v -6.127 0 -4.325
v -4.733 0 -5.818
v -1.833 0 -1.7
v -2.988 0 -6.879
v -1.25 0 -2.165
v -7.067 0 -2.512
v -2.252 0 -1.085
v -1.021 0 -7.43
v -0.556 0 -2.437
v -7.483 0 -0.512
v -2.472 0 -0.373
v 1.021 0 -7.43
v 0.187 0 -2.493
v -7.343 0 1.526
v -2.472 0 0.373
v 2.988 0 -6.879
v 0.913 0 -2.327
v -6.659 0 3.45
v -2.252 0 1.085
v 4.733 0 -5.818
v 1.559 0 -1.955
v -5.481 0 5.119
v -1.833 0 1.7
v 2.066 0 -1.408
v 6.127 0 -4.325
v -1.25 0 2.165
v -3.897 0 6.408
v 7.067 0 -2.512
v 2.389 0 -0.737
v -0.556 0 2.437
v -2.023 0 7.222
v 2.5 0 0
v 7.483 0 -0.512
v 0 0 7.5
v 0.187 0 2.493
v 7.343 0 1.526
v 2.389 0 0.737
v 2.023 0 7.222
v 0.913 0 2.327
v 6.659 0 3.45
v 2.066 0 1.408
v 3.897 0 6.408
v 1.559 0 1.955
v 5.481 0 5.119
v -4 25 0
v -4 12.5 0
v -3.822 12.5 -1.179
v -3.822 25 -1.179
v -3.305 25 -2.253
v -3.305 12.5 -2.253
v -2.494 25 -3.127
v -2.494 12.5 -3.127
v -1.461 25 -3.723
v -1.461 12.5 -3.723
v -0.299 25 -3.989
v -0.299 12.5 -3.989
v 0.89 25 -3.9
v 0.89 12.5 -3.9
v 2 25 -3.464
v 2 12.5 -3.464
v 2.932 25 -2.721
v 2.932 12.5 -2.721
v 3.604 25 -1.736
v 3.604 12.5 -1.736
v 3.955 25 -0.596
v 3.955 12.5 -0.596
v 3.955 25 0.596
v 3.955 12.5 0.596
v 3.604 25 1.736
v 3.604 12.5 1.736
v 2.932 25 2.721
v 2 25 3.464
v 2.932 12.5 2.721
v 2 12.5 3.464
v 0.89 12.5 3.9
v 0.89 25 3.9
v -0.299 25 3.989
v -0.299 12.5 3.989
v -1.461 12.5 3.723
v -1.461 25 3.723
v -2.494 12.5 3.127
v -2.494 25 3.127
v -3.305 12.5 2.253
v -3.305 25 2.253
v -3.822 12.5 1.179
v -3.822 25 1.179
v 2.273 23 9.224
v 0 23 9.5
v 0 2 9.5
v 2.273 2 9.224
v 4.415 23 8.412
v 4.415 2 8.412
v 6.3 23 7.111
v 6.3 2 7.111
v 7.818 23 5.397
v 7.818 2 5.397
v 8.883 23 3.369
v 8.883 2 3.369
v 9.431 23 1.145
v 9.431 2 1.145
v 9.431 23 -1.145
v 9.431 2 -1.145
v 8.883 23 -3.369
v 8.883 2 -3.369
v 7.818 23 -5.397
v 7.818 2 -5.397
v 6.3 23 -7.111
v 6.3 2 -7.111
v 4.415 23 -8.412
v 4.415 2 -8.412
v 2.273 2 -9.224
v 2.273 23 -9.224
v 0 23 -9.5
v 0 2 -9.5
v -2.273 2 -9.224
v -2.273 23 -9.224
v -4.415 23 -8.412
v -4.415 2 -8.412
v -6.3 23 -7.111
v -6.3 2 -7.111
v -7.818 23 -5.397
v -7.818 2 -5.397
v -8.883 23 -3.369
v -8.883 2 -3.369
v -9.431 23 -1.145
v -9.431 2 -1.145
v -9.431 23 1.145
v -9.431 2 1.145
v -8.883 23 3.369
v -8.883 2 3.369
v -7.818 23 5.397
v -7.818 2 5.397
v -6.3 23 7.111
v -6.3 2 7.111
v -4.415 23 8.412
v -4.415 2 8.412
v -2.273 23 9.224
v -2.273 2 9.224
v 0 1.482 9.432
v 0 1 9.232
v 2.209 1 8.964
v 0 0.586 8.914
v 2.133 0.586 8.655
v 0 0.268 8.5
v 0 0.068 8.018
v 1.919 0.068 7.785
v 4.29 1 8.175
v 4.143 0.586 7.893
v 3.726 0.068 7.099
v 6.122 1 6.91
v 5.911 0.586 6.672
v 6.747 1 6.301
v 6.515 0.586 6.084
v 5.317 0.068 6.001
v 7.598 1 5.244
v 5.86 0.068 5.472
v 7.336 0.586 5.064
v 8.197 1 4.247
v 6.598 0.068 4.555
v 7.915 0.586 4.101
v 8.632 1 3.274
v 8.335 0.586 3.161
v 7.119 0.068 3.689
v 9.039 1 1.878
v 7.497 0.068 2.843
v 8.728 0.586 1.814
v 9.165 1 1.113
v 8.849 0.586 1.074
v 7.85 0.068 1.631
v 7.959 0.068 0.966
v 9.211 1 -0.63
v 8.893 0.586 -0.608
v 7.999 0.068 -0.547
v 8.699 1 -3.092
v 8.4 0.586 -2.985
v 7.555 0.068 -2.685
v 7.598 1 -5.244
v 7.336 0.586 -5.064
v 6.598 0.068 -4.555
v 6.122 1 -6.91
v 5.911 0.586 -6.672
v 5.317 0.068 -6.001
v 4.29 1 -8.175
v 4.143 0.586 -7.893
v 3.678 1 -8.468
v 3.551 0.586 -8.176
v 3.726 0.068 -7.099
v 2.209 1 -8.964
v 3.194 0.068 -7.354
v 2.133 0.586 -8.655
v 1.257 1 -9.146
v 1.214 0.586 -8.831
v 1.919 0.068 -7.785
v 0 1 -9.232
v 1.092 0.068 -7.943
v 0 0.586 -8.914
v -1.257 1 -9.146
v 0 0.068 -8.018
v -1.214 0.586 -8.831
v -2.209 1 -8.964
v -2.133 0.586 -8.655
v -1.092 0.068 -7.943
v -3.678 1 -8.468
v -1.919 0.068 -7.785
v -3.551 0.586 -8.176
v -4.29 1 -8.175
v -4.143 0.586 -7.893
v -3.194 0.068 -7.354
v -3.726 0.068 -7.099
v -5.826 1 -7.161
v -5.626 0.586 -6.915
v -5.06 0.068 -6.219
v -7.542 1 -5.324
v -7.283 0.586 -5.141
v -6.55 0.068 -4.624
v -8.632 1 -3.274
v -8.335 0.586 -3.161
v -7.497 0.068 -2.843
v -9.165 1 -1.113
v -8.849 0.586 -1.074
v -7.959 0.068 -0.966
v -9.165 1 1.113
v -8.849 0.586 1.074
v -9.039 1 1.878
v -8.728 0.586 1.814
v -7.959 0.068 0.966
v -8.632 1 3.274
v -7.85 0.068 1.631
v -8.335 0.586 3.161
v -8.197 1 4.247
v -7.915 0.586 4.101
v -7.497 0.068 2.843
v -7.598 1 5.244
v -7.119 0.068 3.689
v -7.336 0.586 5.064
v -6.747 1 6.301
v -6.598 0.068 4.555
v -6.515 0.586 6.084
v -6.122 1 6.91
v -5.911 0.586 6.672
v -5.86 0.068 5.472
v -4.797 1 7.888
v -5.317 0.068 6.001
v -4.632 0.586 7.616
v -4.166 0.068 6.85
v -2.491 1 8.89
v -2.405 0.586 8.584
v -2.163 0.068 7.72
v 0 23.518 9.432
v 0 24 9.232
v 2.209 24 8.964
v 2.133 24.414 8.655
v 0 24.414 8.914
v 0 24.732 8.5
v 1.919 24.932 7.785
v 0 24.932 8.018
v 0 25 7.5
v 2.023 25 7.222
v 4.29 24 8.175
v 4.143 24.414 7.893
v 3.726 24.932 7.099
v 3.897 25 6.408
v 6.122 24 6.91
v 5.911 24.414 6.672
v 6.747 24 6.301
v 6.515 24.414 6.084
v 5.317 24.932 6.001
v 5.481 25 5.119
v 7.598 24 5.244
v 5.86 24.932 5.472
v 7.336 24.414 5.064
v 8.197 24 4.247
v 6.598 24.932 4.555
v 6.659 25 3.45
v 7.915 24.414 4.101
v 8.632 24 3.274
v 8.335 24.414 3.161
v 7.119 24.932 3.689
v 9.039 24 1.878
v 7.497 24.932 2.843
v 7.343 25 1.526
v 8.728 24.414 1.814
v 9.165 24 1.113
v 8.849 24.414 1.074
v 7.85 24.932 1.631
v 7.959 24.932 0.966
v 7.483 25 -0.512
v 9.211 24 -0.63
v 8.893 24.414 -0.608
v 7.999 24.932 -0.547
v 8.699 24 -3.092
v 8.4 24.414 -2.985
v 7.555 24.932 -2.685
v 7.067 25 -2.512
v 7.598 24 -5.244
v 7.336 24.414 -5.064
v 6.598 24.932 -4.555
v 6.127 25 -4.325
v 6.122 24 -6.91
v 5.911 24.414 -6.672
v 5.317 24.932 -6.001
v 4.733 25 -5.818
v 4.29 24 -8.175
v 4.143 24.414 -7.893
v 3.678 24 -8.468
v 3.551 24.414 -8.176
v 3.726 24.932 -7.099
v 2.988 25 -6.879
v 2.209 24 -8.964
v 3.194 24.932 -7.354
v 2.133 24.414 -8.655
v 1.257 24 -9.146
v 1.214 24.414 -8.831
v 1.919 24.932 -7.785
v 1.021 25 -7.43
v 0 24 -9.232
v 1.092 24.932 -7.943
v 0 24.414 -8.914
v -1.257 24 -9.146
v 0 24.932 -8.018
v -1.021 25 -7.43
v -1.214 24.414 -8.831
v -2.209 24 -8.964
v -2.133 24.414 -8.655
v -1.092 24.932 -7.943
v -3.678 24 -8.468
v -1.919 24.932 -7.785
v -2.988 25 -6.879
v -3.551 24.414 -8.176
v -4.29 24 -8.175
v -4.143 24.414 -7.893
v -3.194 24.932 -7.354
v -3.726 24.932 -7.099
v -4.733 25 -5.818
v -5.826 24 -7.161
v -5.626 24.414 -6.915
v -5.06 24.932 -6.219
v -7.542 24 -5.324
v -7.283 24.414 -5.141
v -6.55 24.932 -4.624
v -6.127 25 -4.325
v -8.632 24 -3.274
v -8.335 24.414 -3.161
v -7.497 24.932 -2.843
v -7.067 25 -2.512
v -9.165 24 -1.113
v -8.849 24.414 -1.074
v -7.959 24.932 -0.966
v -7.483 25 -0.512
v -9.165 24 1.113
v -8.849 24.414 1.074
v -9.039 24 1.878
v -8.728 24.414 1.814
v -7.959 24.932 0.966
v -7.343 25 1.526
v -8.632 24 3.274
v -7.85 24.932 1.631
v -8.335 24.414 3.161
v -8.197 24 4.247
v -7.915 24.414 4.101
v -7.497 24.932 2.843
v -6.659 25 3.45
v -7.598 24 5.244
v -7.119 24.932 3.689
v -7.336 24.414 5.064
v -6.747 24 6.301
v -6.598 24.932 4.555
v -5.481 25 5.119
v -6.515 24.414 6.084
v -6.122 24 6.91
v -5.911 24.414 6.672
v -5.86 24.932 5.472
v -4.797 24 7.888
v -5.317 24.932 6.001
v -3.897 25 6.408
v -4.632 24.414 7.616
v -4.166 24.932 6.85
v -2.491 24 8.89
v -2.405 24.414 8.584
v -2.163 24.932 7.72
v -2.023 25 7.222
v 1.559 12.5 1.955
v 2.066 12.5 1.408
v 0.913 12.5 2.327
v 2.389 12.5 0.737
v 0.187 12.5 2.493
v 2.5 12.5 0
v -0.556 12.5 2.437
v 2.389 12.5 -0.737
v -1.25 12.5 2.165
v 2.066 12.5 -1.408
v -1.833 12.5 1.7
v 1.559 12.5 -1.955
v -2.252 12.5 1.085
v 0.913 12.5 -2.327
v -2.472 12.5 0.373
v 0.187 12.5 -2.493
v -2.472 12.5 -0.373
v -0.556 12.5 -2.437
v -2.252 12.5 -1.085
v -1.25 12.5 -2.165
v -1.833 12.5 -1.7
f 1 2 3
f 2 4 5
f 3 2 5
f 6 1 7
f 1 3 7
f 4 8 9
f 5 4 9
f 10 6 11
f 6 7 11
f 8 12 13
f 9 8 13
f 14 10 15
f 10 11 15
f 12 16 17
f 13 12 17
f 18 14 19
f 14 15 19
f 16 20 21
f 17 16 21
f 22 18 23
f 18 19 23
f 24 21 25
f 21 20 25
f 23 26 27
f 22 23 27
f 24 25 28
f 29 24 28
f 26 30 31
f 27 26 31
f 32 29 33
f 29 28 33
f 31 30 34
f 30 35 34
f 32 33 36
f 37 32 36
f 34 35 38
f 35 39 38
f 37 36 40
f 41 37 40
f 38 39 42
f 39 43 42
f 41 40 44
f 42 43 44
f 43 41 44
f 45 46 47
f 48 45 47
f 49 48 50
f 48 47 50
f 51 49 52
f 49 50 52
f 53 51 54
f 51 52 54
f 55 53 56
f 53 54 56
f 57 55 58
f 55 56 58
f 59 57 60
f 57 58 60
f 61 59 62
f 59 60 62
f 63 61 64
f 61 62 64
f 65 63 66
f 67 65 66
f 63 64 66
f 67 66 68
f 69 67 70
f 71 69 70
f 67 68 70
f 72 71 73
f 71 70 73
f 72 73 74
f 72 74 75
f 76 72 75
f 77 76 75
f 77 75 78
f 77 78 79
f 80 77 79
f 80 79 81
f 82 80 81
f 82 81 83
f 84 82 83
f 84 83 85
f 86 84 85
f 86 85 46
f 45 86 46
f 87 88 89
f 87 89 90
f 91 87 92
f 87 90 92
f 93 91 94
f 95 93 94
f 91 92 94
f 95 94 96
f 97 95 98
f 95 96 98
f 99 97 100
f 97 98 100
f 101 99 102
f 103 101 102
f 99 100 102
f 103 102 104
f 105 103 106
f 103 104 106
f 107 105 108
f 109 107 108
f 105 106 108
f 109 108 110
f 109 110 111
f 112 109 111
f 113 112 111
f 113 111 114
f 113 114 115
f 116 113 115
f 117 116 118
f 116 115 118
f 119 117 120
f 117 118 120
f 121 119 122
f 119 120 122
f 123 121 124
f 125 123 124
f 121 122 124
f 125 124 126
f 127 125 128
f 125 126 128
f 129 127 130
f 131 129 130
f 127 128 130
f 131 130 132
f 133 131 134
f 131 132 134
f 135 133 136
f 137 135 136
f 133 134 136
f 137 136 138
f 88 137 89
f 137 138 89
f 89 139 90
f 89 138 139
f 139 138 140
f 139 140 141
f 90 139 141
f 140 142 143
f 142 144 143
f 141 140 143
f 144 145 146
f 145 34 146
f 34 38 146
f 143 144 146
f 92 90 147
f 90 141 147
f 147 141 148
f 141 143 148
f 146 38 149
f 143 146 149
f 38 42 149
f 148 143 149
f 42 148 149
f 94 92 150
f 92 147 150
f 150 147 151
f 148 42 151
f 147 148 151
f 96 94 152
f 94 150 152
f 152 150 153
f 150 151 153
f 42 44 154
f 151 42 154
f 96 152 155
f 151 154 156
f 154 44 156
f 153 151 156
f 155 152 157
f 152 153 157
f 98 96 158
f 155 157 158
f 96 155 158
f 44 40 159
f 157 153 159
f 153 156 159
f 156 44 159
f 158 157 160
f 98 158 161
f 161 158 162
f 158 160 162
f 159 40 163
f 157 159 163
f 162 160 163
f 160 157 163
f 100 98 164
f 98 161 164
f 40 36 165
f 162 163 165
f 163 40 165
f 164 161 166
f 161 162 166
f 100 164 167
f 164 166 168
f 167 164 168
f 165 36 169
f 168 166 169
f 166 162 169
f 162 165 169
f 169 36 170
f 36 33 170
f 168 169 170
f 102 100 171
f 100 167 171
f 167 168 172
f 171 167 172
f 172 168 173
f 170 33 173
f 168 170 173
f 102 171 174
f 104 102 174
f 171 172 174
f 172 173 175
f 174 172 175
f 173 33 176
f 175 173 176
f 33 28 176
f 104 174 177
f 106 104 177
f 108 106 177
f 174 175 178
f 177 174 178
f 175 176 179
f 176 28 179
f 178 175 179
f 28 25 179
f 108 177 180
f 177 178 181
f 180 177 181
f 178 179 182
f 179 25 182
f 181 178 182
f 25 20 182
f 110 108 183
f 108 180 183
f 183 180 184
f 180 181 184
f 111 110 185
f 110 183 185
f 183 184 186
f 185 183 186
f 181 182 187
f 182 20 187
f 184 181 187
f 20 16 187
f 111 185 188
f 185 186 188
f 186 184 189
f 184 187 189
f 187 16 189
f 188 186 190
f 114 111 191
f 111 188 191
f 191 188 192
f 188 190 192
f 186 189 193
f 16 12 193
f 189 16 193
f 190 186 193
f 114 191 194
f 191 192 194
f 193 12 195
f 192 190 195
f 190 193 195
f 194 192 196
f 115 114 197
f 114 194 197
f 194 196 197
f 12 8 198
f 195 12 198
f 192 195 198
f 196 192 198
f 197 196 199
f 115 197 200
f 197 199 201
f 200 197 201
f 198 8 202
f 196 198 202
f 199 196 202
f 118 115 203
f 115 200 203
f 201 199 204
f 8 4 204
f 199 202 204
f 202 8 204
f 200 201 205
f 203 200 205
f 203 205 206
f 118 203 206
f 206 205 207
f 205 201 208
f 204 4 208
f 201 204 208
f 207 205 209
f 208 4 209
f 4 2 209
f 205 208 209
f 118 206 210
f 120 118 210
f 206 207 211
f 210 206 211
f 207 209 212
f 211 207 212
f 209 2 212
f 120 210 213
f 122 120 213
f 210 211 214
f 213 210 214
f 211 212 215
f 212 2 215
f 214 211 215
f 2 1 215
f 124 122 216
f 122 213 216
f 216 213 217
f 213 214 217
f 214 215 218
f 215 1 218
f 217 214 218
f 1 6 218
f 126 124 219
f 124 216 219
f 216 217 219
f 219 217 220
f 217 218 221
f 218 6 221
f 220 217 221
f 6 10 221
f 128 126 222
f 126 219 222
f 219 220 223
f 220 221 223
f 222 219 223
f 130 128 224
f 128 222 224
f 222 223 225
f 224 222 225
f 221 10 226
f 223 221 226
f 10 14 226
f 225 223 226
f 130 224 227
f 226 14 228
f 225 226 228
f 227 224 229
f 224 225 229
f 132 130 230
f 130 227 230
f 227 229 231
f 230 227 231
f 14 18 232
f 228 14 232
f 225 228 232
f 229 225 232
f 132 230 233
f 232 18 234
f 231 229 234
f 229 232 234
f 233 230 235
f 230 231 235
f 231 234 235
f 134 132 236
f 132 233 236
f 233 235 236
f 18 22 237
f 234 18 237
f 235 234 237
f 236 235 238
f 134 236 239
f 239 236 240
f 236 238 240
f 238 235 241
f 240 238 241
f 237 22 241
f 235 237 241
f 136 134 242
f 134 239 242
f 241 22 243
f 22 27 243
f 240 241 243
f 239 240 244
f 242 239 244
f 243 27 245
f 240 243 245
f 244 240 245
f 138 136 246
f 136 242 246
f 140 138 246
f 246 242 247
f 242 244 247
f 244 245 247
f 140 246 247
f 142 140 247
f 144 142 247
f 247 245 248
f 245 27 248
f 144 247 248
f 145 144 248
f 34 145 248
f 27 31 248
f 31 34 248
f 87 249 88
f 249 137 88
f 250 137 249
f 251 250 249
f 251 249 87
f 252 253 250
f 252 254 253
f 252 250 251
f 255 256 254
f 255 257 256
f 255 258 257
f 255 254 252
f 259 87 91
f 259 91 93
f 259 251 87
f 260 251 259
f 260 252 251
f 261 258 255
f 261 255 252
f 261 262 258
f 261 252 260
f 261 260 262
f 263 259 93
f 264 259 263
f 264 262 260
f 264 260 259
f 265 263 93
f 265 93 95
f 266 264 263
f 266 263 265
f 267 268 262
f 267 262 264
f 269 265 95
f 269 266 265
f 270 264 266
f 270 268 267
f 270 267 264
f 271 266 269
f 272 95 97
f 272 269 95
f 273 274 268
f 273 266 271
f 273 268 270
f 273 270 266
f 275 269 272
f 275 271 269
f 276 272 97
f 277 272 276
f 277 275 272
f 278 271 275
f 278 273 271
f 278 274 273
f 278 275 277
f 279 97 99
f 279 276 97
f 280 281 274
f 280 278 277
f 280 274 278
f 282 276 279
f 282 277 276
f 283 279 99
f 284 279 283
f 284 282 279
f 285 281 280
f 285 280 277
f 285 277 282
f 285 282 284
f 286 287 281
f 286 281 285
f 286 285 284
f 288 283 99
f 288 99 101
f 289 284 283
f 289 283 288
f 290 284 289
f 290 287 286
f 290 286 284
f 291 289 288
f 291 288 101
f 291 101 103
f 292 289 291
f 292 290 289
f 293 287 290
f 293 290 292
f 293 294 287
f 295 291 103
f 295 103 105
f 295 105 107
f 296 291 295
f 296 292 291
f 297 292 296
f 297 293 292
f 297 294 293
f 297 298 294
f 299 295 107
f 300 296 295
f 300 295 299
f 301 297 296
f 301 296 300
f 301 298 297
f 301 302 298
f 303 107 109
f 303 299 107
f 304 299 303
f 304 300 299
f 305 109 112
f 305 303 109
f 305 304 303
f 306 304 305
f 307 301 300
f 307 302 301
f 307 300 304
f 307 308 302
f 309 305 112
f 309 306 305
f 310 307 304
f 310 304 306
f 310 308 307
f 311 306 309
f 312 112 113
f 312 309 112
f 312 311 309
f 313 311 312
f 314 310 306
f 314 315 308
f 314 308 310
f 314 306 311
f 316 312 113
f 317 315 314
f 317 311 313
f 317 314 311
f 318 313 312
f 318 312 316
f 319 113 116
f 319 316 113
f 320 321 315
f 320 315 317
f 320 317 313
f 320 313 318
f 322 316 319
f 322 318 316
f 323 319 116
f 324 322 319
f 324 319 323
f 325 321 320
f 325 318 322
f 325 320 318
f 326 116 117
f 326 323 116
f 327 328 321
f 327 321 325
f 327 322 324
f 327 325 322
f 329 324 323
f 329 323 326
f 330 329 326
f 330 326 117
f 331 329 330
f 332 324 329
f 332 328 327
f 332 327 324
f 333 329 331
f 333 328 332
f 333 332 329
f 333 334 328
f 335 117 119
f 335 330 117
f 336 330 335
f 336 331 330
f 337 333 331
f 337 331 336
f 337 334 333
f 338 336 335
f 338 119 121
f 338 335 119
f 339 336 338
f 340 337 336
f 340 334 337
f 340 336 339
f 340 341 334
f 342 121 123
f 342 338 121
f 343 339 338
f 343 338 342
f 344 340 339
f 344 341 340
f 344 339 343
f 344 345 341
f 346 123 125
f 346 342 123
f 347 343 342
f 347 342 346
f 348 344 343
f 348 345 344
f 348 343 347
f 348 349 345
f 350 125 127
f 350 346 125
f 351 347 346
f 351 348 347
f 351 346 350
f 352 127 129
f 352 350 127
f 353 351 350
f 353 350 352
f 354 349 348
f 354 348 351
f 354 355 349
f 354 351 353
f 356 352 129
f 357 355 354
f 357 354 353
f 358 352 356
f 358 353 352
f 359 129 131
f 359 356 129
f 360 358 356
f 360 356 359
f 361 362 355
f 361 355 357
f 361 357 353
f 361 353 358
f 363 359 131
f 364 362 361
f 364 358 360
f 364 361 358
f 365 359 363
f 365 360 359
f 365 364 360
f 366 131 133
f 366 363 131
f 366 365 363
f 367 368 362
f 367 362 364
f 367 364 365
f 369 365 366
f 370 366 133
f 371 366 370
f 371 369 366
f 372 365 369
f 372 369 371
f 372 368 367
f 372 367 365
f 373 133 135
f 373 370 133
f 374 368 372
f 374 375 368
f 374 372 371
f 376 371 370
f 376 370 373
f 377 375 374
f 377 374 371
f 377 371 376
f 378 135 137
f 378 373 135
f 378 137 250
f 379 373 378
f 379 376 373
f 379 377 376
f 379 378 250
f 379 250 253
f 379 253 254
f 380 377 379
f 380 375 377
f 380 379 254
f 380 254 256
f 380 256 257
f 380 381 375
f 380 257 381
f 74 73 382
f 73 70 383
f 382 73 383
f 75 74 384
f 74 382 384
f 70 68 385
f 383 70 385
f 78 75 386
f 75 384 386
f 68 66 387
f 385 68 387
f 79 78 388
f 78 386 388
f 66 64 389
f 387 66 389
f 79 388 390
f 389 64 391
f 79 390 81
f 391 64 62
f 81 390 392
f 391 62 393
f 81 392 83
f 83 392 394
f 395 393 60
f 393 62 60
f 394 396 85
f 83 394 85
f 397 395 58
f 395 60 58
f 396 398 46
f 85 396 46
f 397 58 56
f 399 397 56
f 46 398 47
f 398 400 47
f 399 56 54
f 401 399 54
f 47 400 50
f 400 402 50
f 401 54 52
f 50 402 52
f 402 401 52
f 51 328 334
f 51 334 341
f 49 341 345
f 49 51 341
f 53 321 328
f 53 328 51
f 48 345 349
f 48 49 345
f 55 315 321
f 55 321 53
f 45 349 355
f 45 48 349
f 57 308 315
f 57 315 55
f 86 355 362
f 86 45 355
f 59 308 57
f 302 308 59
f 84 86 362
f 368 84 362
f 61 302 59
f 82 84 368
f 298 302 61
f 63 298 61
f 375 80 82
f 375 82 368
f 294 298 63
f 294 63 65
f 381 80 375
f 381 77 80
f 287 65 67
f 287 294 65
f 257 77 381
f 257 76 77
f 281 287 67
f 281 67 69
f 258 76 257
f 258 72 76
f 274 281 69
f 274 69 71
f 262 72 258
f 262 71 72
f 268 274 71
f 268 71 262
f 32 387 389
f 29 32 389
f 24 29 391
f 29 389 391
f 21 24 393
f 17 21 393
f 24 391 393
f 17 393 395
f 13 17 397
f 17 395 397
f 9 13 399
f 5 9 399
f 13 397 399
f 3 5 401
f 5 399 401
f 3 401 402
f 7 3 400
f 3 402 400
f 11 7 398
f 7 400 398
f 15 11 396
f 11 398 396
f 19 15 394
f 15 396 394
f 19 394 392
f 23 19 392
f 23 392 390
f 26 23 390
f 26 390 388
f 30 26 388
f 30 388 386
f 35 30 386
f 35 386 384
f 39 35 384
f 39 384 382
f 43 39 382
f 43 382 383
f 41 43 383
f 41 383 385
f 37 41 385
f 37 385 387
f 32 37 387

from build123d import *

# Parameters (mm, degrees)
SKETCH_1_R          = 9.5
EXTRUDE_1_DEPTH     = 25
FILLET_1_R          = 2
HOLE_WIZARD_1_D     = 8
HOLE_WIZARD_1_DEPTH = 12.5
HOLE_WIZARD_2_D     = 5


with BuildPart() as part:
    # 草图1 → 凸台-拉伸1 (new body)
    with BuildSketch(Plane(origin=(0, 0, 0), x_dir=(1, 0, 0), z_dir=(0, 1, 0))):
        Circle(SKETCH_1_R)
    extrude(amount=EXTRUDE_1_DEPTH)

    # 圆角1
    fillet_1_edges = [part.edges().sort_by_distance(p)[0] for p in [
        (-9.5, 0, 0),
        (-9.5, 25, 0),
    ]]
    fillet(fillet_1_edges, radius=FILLET_1_R)

    # 孔1
    with Locations(Plane(origin=(0, 25, 0), x_dir=(1, 0, 0), z_dir=(0, 1, 0))):
        with Locations((0, 0)):
            Hole(HOLE_WIZARD_1_D / 2, depth=HOLE_WIZARD_1_DEPTH)

    # 孔2 (through all)
    with Locations(Plane(origin=(0, 0, 0), x_dir=(-1, 0, 0), z_dir=(0, -1, 0))):
        with Locations((0, 0)):
            Hole(HOLE_WIZARD_2_D / 2)


solid = part.part
